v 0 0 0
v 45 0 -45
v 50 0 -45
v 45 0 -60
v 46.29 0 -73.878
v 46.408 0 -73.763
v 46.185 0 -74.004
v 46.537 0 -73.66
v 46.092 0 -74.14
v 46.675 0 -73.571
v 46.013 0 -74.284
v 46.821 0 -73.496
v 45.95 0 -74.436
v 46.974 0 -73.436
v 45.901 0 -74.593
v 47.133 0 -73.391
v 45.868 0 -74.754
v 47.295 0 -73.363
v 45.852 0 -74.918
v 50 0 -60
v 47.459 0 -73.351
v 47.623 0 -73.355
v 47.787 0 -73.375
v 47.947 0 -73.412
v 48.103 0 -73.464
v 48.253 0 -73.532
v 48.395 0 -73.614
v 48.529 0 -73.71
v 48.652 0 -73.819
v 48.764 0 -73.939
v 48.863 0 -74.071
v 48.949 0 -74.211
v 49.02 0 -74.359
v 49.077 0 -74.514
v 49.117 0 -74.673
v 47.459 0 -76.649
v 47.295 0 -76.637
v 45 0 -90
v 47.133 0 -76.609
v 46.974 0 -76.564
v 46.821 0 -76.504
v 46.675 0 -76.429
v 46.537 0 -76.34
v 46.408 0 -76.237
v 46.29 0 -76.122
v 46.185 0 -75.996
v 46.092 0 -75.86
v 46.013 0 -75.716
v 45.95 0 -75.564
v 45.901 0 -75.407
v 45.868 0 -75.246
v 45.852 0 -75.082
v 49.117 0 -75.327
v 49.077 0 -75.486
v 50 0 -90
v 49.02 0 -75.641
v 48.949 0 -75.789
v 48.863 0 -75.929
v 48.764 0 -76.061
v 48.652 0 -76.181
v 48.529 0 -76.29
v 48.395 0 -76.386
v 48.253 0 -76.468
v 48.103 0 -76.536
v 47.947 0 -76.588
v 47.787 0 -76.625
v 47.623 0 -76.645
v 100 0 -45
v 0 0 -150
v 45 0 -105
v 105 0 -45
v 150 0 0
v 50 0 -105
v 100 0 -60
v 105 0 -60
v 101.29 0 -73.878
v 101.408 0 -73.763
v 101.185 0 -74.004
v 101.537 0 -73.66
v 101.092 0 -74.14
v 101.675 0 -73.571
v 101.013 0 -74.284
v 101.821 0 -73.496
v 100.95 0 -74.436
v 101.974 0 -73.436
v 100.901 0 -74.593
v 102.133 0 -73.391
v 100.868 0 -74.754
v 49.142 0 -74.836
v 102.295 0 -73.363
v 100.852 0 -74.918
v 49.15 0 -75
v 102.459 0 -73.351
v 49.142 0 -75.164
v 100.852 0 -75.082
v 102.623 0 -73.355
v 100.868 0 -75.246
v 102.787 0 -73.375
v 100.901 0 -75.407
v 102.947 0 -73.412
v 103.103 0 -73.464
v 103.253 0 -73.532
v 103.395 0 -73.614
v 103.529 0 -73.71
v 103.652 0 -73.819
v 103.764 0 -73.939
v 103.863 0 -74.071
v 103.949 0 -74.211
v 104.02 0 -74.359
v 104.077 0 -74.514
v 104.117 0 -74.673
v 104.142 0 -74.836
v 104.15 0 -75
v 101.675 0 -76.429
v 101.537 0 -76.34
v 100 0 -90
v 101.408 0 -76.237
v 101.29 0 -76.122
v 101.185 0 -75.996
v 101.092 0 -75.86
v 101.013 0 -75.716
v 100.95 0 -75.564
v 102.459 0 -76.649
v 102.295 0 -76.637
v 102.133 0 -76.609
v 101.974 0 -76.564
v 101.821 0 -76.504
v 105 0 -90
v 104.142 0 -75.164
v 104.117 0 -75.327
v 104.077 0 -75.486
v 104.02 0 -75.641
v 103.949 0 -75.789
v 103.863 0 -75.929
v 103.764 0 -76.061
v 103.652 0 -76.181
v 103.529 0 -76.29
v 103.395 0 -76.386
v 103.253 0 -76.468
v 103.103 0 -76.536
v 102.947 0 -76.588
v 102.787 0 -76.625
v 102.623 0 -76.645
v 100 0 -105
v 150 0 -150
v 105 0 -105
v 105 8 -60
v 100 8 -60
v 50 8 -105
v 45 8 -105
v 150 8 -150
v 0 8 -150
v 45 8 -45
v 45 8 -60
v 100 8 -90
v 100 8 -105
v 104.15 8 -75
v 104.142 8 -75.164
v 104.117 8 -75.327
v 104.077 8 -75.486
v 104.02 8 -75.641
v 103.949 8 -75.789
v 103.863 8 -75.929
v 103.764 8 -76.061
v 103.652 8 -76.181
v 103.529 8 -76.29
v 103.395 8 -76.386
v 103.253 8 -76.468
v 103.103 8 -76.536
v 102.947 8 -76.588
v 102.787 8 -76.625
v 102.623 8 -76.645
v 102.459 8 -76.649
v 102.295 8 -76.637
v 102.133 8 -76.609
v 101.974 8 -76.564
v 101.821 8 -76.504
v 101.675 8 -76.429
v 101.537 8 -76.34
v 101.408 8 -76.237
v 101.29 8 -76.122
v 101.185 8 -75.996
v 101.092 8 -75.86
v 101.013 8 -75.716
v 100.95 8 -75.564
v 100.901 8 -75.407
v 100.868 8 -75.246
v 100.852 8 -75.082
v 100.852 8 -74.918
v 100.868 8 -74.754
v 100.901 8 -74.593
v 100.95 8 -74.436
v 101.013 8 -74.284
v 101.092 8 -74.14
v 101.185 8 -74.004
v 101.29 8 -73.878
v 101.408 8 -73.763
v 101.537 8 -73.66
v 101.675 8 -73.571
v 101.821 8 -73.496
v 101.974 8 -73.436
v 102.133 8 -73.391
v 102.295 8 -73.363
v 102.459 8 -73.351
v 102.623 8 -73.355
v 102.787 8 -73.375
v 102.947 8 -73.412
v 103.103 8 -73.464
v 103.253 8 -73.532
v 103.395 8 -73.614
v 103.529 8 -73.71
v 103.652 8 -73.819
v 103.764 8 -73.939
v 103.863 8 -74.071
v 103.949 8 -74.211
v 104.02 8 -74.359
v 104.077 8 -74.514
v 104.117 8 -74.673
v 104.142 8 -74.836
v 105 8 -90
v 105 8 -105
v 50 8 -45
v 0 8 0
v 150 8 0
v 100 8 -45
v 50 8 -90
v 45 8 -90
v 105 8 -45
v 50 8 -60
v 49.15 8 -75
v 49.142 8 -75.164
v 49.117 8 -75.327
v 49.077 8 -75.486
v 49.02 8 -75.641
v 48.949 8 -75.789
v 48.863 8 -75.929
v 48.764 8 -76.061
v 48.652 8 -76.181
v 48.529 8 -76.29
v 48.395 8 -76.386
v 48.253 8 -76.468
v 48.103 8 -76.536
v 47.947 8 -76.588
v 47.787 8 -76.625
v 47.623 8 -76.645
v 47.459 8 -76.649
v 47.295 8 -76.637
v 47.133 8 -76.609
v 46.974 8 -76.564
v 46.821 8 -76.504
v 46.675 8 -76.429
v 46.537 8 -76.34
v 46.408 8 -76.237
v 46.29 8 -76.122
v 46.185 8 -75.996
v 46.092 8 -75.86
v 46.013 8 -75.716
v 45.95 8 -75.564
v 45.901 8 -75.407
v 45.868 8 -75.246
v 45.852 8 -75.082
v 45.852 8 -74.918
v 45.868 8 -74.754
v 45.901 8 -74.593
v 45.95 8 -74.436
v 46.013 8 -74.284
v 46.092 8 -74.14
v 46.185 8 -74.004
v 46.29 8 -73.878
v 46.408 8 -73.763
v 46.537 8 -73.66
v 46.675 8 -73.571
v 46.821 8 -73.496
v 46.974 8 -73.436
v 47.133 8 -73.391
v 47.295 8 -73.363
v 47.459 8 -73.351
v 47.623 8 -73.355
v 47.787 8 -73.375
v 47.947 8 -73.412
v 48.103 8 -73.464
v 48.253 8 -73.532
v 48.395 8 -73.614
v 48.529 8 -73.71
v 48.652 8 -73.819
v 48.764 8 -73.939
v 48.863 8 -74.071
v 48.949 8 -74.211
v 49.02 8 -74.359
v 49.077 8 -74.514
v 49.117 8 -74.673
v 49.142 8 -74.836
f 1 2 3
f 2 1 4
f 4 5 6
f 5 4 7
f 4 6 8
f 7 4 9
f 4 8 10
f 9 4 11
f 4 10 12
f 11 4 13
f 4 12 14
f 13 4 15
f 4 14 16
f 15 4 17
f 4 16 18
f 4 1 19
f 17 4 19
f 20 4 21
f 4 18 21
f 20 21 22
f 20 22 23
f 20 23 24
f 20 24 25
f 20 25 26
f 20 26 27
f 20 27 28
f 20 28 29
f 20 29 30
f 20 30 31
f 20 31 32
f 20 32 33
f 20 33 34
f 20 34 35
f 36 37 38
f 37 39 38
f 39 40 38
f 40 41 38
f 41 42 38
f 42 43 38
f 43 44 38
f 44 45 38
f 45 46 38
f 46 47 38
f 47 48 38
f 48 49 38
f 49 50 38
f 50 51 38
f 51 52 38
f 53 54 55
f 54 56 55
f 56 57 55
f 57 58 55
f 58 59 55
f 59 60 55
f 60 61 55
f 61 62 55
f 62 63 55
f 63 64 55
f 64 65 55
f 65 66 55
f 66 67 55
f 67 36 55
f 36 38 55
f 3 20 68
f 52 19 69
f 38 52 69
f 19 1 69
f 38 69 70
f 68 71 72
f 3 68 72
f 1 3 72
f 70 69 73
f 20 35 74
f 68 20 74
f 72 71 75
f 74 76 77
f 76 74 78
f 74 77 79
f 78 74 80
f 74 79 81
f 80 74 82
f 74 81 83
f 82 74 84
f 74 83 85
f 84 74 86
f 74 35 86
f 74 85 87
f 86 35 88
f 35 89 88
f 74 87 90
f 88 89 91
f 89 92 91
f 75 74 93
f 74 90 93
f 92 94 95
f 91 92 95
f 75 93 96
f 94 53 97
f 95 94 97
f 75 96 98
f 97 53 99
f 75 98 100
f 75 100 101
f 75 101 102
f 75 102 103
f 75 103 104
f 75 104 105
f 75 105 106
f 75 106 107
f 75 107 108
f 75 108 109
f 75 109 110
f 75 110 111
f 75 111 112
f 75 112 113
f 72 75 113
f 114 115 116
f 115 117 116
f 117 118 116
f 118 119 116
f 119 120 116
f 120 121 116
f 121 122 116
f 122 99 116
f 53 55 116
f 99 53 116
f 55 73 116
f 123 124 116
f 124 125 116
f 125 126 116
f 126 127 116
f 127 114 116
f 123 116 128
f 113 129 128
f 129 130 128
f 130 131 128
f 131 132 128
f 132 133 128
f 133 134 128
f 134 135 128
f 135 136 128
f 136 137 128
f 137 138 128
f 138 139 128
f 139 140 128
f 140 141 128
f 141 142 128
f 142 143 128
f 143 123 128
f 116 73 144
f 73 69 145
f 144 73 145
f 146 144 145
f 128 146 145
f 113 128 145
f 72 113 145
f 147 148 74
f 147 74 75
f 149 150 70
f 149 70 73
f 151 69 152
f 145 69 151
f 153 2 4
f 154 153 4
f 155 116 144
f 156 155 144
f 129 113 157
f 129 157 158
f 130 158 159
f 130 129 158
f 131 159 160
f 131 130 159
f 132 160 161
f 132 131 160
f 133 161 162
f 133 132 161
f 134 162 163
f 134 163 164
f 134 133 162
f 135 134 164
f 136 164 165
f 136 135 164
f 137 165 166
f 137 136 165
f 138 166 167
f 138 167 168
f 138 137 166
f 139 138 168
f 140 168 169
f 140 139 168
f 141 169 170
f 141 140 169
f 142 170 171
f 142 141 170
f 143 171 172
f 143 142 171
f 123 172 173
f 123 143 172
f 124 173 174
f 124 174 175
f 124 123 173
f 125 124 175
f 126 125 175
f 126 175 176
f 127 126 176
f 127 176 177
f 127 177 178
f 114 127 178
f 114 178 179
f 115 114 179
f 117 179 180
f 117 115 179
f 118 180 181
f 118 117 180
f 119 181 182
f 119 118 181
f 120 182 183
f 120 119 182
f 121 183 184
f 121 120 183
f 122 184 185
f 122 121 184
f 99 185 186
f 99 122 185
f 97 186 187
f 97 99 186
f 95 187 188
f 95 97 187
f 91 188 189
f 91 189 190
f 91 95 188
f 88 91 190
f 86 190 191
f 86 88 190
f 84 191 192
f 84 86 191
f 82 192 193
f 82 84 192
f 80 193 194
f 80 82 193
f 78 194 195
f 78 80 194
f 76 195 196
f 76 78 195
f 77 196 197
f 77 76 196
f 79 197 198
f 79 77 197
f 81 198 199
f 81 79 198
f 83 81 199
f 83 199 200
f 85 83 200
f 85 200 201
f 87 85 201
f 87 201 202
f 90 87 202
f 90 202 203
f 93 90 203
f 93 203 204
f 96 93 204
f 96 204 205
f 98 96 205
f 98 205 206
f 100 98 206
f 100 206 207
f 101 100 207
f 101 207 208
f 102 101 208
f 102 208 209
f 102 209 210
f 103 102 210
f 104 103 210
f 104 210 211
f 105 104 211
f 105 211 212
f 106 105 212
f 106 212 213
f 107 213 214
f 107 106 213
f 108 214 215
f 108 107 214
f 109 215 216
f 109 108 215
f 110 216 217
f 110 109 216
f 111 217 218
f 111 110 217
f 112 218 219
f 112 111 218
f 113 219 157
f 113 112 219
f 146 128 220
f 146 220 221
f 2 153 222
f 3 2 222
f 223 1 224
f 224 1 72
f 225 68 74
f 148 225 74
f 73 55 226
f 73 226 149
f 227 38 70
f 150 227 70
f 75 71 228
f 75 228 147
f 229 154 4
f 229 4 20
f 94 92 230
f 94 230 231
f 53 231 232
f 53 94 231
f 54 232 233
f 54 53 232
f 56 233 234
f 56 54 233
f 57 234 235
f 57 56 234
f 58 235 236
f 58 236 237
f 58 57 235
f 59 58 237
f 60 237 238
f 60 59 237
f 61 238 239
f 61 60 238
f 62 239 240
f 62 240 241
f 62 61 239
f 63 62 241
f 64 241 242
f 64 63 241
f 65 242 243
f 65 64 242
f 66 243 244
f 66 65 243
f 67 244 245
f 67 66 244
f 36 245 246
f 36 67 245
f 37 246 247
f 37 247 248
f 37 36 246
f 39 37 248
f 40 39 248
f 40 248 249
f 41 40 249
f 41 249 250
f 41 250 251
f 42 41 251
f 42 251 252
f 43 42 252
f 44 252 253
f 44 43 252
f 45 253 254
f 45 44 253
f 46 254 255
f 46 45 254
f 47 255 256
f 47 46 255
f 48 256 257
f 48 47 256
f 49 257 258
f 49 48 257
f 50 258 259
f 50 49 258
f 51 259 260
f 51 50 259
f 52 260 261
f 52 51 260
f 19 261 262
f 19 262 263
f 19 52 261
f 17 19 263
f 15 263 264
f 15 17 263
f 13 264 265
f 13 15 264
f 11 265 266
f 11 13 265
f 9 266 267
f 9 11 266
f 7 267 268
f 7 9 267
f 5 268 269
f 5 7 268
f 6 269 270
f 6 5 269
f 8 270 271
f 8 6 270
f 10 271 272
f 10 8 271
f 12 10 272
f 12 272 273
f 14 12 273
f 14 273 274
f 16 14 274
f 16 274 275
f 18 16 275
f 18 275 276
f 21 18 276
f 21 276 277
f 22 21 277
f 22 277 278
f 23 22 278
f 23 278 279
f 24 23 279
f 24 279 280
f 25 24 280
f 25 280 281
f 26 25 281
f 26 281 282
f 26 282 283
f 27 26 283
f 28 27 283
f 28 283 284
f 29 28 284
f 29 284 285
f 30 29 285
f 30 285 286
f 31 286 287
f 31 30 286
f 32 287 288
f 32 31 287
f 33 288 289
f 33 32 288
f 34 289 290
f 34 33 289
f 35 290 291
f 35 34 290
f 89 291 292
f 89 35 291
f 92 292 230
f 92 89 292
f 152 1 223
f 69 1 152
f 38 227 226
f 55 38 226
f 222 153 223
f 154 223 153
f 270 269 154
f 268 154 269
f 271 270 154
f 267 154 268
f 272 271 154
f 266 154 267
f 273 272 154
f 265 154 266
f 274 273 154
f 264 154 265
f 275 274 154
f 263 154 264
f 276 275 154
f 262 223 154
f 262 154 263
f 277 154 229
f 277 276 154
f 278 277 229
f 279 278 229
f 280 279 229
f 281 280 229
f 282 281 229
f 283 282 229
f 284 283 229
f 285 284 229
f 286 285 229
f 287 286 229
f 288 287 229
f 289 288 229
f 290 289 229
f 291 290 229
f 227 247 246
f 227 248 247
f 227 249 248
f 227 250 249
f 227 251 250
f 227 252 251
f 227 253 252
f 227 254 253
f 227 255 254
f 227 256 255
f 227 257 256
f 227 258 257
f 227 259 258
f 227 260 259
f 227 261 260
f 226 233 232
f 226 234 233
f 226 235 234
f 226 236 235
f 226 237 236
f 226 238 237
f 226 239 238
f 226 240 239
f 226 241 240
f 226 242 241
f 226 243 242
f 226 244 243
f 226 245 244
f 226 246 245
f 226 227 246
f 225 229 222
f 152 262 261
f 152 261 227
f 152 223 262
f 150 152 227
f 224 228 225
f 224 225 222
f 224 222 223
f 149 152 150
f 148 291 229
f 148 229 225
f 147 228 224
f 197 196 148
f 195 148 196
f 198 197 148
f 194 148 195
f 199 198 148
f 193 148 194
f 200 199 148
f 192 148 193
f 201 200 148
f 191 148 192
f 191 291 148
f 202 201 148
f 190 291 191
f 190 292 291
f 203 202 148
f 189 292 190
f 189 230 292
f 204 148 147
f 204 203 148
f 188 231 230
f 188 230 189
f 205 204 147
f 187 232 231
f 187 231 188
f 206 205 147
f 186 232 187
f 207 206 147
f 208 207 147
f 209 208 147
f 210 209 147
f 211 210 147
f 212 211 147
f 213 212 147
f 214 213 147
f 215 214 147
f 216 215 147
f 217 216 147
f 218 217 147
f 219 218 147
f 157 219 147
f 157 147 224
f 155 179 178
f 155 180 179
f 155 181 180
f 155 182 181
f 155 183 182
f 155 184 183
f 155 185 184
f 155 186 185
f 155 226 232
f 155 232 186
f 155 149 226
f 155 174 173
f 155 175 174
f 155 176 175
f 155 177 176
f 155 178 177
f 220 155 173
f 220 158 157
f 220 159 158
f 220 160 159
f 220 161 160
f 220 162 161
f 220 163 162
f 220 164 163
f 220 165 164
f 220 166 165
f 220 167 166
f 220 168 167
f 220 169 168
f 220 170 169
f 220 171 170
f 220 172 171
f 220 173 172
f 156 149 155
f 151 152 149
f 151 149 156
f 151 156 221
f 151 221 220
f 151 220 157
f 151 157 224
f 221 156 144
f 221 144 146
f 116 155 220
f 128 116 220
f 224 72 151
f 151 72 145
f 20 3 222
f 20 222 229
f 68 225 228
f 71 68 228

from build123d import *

# Parameters (mm, degrees)
SKETCH1_W           = 150
SKETCH1_H           = 150
SKETCH1_R           = 1.65
SKETCH1_W_2         = 5
SKETCH1_H_2         = 15
BOSS_EXTRUDE1_DEPTH = 8


with BuildPart() as part:
    # Sketch1 → Boss-Extrude1 (new body)
    with BuildSketch(Plane(origin=(0, 0, 0), x_dir=(1, 0, 0), z_dir=(0, 1, 0))):
        with Locations((75, 75)):
            Rectangle(SKETCH1_W, SKETCH1_H)
        with Locations((102.5, 75)):
            Circle(SKETCH1_R, mode=Mode.SUBTRACT)
        with Locations((47.5, 75)):
            Circle(SKETCH1_R, mode=Mode.SUBTRACT)
        with Locations((102.5, 52.5)):
            Rectangle(SKETCH1_W_2, SKETCH1_H_2, mode=Mode.SUBTRACT)
        with Locations((102.5, 97.5)):
            Rectangle(SKETCH1_W_2, SKETCH1_H_2, mode=Mode.SUBTRACT)
        with Locations((47.5, 52.5)):
            Rectangle(SKETCH1_W_2, SKETCH1_H_2, mode=Mode.SUBTRACT)
        with Locations((47.5, 97.5)):
            Rectangle(SKETCH1_W_2, SKETCH1_H_2, mode=Mode.SUBTRACT)
    extrude(amount=BOSS_EXTRUDE1_DEPTH)


solid = part.part
